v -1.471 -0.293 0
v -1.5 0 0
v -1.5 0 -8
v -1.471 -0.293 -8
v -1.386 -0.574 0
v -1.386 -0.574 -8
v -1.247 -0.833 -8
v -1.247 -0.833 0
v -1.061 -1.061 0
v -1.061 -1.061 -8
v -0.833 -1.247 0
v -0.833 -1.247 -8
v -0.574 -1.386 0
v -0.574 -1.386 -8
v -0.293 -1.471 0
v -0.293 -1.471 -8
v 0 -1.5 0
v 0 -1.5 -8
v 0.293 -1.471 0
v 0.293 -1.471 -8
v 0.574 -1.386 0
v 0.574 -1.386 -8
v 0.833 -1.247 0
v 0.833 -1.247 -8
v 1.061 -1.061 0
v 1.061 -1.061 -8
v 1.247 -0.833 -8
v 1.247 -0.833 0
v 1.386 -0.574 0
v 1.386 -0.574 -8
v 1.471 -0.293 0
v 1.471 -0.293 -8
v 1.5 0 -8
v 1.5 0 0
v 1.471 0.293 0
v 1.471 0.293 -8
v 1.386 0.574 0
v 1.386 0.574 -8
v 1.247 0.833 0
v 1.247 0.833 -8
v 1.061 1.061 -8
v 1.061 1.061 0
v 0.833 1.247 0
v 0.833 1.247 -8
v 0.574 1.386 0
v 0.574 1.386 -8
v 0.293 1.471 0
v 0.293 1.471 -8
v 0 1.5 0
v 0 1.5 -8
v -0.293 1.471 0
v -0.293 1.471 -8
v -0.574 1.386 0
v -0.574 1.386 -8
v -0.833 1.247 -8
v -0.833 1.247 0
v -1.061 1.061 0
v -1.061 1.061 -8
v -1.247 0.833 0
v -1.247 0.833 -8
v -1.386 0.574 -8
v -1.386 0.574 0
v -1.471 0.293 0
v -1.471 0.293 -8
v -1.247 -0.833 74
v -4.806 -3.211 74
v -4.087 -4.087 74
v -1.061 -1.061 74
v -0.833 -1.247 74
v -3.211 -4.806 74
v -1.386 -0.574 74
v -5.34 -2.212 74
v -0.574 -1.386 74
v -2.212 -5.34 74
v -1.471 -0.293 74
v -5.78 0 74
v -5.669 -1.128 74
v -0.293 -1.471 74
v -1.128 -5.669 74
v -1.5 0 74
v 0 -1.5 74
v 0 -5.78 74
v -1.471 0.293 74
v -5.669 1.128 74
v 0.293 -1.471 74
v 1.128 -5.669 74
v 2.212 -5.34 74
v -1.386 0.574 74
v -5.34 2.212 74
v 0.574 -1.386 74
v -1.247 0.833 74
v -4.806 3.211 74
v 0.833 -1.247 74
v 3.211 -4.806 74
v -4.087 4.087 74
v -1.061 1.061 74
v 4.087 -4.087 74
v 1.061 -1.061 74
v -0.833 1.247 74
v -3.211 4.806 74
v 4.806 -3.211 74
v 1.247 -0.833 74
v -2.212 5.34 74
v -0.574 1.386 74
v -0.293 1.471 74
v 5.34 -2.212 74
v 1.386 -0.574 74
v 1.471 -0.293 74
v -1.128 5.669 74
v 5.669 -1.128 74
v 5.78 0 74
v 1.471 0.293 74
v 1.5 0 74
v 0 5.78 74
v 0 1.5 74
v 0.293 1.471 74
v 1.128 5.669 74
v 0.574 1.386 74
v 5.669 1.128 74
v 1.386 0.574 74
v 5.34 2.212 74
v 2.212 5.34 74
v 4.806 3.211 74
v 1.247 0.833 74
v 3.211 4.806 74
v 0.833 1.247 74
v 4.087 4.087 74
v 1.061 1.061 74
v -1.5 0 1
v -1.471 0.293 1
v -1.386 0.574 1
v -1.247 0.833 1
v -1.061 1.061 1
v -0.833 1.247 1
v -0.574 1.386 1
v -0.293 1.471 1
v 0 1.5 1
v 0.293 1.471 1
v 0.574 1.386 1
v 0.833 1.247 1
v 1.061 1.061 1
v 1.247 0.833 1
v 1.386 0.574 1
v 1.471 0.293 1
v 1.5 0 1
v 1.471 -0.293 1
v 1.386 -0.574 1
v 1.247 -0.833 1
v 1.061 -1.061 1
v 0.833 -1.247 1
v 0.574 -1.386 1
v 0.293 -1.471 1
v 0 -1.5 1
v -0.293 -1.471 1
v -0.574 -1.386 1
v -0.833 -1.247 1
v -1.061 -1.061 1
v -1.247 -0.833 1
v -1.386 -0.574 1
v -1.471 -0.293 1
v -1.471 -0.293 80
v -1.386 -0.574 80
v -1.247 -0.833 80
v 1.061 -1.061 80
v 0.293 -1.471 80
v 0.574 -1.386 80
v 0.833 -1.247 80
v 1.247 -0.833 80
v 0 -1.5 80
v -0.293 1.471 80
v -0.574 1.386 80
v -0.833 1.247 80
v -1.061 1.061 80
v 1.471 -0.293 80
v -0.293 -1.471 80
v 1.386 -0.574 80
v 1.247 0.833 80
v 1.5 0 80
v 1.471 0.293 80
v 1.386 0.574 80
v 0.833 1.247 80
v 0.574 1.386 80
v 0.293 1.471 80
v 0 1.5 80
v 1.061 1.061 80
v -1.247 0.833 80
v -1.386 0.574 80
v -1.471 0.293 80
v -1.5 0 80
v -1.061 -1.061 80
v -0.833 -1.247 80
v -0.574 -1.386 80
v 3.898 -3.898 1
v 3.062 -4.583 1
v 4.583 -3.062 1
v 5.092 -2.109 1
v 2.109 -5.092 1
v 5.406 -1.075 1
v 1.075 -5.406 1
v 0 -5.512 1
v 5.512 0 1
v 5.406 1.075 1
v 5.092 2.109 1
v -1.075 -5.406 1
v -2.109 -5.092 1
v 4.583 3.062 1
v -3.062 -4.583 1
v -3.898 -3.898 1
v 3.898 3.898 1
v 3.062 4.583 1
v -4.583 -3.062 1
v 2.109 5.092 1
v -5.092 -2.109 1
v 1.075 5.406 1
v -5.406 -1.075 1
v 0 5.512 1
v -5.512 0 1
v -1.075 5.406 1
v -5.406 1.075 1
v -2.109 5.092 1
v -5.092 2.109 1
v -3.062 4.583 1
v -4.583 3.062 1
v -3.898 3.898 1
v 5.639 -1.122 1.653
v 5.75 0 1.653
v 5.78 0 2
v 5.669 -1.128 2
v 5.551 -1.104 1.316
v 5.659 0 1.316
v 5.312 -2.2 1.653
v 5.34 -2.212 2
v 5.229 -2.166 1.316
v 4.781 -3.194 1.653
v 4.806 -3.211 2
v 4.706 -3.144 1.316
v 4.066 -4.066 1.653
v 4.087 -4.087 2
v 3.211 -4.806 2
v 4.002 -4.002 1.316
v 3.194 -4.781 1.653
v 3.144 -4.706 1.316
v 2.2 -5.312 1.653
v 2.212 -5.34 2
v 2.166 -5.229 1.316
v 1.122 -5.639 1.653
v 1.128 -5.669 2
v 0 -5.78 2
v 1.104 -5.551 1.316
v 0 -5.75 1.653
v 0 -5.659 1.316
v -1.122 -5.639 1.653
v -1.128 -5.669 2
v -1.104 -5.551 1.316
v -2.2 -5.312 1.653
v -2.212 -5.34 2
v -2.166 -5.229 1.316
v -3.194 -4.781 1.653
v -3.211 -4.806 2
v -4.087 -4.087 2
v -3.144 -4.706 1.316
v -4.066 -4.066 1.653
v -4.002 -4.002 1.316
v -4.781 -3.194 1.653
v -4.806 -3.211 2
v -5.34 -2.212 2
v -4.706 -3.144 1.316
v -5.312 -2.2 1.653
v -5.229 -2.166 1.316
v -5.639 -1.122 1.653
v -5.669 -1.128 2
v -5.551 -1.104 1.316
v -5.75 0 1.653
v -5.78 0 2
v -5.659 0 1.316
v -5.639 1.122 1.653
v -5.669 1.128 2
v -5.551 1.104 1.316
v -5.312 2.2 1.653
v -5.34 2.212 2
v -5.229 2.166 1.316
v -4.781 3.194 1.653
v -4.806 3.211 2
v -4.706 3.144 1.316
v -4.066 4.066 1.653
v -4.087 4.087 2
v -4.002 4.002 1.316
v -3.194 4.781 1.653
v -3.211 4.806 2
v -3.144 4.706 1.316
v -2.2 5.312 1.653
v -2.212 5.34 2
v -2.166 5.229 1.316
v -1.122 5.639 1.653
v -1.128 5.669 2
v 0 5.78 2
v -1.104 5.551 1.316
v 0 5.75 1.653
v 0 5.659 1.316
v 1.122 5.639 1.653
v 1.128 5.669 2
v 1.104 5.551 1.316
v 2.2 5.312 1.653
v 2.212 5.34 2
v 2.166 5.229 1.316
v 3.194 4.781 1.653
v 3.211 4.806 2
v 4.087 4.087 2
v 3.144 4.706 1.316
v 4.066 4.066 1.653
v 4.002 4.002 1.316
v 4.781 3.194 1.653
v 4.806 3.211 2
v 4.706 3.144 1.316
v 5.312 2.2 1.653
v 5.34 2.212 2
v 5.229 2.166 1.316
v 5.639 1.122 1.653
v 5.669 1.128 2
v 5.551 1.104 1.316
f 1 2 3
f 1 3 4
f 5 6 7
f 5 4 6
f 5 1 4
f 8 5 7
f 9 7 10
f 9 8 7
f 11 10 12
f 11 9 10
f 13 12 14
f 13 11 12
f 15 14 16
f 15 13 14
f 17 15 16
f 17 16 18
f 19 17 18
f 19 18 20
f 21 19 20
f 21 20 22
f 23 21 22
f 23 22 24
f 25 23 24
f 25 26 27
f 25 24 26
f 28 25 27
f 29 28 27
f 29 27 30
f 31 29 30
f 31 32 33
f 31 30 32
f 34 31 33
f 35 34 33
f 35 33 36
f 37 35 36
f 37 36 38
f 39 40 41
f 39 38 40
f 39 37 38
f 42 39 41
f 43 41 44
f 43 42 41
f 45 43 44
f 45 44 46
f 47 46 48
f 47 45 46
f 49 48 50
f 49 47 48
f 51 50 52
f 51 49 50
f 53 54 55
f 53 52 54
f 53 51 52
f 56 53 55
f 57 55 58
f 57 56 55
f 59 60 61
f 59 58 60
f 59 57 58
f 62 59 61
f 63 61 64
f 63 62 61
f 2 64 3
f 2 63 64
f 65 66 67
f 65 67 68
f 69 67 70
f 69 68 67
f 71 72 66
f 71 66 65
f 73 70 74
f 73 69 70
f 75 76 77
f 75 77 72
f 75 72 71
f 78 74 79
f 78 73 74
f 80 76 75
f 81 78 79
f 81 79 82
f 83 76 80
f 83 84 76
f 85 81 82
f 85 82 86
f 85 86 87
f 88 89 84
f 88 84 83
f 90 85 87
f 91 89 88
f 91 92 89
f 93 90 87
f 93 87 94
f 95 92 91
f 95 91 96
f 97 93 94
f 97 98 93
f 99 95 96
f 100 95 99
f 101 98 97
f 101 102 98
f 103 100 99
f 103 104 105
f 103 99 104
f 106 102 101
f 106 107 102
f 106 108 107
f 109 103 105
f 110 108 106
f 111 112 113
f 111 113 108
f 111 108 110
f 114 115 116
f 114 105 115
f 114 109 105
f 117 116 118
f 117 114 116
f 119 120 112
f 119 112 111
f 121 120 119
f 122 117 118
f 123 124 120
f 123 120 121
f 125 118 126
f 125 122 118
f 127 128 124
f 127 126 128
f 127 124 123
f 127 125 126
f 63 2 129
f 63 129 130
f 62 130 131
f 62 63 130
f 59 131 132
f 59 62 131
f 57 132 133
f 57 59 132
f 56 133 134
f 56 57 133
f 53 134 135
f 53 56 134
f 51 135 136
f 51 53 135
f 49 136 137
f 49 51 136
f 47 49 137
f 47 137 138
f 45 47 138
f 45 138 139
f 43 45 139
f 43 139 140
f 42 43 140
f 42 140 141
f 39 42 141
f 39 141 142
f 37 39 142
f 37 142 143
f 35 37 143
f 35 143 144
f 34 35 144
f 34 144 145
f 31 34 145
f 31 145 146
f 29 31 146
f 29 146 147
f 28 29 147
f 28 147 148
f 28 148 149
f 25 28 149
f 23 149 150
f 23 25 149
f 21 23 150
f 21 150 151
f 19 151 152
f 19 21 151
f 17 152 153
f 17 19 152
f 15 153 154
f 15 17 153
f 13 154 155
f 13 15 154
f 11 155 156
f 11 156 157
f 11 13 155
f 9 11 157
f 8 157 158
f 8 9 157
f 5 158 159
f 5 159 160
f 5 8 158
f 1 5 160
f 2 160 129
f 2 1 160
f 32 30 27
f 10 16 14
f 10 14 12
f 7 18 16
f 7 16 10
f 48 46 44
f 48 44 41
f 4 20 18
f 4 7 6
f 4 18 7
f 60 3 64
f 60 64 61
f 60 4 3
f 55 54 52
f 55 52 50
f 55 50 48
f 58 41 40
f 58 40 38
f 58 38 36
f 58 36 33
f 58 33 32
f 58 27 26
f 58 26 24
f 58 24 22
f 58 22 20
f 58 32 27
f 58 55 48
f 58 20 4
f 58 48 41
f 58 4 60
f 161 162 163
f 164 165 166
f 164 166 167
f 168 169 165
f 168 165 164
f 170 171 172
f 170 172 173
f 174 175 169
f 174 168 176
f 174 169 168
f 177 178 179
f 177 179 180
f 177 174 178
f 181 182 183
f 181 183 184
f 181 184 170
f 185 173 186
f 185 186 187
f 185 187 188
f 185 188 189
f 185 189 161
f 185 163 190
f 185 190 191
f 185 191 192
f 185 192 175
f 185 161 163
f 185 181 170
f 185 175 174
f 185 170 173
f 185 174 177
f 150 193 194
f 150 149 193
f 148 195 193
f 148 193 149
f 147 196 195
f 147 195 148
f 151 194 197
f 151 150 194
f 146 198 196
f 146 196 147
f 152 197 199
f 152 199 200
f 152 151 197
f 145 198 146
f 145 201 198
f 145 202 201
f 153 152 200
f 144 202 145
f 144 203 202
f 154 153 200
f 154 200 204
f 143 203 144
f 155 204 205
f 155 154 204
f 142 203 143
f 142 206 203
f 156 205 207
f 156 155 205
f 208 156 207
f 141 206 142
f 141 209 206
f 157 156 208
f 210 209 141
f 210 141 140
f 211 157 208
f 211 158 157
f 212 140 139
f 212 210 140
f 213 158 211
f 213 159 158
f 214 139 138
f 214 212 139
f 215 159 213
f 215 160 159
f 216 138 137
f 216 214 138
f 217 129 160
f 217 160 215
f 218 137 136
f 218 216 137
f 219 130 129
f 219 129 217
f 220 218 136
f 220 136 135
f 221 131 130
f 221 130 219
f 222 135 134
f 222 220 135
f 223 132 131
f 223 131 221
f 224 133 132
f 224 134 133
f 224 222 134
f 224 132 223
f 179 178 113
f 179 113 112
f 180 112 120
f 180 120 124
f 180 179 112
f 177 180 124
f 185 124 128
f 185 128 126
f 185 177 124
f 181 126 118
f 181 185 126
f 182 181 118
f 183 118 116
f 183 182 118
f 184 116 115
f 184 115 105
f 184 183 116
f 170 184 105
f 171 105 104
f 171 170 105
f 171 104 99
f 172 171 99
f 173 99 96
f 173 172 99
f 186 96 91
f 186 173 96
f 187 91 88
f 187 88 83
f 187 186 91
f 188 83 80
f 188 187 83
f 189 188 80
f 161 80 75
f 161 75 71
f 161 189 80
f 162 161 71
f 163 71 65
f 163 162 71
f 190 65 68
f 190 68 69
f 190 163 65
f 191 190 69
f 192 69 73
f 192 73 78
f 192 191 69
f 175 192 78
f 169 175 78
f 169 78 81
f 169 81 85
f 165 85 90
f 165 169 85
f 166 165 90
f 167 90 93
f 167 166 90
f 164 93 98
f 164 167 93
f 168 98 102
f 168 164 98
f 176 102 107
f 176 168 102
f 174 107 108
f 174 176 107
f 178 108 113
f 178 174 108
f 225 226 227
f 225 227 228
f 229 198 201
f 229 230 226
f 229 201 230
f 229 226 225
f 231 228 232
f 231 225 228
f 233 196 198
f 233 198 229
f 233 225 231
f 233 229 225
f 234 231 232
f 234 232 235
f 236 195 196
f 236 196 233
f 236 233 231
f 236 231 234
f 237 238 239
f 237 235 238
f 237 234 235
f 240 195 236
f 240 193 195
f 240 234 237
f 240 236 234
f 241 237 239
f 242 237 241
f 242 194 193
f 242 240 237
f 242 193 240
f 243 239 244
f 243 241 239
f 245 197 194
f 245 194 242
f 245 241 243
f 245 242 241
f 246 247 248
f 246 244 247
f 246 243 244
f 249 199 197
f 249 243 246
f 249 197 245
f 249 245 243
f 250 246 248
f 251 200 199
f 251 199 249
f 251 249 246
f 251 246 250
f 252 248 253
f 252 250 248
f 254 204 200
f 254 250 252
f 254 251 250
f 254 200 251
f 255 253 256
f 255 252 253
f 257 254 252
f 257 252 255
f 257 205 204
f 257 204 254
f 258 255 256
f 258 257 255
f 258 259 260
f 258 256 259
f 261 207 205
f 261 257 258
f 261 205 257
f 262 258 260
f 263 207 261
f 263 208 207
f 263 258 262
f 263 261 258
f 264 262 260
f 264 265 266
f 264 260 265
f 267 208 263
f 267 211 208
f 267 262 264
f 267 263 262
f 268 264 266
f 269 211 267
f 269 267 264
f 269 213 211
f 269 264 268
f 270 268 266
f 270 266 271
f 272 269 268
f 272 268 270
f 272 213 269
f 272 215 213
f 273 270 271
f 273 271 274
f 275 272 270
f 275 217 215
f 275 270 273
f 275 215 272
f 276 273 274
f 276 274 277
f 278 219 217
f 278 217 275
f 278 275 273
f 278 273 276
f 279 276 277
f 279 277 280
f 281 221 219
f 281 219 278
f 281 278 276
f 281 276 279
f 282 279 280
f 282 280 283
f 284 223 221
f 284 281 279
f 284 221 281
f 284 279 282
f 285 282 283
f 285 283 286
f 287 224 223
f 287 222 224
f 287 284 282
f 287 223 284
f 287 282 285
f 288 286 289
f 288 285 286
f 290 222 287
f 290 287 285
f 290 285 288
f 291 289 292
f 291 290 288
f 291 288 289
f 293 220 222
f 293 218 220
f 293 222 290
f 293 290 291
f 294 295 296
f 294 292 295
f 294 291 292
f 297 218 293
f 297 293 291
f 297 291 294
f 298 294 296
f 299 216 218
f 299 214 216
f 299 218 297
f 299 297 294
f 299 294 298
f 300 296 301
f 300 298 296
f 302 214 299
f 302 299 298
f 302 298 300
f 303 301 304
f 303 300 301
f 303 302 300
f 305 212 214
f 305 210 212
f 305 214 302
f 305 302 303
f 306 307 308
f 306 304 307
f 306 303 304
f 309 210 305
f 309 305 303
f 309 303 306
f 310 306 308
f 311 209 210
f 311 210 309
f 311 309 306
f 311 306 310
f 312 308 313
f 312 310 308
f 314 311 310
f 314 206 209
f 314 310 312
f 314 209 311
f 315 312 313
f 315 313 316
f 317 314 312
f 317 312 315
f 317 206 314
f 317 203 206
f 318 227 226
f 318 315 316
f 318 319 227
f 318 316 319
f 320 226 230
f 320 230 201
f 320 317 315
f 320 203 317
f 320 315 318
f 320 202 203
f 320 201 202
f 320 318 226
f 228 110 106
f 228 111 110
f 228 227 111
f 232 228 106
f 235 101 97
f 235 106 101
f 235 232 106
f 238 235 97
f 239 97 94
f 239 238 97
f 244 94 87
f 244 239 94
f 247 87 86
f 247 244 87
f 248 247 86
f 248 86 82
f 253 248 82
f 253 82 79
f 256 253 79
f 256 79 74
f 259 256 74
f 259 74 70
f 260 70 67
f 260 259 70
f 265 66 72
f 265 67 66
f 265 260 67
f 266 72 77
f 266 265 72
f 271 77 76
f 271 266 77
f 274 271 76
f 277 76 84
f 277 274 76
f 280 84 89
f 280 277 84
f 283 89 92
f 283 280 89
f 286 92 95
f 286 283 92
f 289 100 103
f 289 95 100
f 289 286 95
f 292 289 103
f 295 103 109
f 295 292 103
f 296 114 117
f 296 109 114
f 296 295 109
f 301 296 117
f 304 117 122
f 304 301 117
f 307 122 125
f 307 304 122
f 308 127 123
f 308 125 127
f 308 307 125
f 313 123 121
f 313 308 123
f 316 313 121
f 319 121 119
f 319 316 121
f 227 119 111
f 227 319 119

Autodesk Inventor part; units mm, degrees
ref_plane "YZ Plane" through (0, 0, 0) normal (1, 0, 0) x (0, 1, 0)
ref_plane "XZ Plane" through (0, 0, 0) normal (0, 1, 0) x (-1, 0, 0)
ref_plane "XY Plane" through (0, 0, 0) normal (0, 0, 1) x (1, 0, 0)
sketch "Sketch1" plane through (0, 0, 0) normal (0, 0, 1) x (1, 0, 0)
  circle A0 centre (0, 0) radius 5.78
  dimension "d0" = 11.56
extrude "Extrusion1" add sketch "Sketch1" along normal blind 80
fillet "Fillet1" radius 2 2 edges at (-5.78, 0, 80) (-5.78, 0, 0)
sketch "Sketch2" plane through (0, 0, 80) normal (0, 0, 1) x (1, 0, 0)
  circle A0 centre (0, 0) radius 1.5
  circle A1 centre (0, 0) radius 5.78
  dimension "d4" = 3
  dimension "d5" = 11.56
extrude "Extrusion2" cut sketch "Sketch2" against normal blind 6
sketch "Sketch3" plane through (0, 0, 0) normal (0, 0, -1) x (-1, 0, 0)
  circle A0 centre (0, 0) radius 1.5 projected
  circle A1 centre (0, 0) radius 1.5
  circle A2 centre (0, 0) radius 5.78
extrude "Extrusion3" cut sketch "Sketch3" against normal blind 1
sketch "Sketch4" plane through (0, 0, 0) normal (0, 0, -1) x (-1, 0, 0)
  circle A0 centre (0, 0) radius 1.5
extrude "Extrusion4" add sketch "Sketch4" along normal blind 8
properties part number "cylinder"
